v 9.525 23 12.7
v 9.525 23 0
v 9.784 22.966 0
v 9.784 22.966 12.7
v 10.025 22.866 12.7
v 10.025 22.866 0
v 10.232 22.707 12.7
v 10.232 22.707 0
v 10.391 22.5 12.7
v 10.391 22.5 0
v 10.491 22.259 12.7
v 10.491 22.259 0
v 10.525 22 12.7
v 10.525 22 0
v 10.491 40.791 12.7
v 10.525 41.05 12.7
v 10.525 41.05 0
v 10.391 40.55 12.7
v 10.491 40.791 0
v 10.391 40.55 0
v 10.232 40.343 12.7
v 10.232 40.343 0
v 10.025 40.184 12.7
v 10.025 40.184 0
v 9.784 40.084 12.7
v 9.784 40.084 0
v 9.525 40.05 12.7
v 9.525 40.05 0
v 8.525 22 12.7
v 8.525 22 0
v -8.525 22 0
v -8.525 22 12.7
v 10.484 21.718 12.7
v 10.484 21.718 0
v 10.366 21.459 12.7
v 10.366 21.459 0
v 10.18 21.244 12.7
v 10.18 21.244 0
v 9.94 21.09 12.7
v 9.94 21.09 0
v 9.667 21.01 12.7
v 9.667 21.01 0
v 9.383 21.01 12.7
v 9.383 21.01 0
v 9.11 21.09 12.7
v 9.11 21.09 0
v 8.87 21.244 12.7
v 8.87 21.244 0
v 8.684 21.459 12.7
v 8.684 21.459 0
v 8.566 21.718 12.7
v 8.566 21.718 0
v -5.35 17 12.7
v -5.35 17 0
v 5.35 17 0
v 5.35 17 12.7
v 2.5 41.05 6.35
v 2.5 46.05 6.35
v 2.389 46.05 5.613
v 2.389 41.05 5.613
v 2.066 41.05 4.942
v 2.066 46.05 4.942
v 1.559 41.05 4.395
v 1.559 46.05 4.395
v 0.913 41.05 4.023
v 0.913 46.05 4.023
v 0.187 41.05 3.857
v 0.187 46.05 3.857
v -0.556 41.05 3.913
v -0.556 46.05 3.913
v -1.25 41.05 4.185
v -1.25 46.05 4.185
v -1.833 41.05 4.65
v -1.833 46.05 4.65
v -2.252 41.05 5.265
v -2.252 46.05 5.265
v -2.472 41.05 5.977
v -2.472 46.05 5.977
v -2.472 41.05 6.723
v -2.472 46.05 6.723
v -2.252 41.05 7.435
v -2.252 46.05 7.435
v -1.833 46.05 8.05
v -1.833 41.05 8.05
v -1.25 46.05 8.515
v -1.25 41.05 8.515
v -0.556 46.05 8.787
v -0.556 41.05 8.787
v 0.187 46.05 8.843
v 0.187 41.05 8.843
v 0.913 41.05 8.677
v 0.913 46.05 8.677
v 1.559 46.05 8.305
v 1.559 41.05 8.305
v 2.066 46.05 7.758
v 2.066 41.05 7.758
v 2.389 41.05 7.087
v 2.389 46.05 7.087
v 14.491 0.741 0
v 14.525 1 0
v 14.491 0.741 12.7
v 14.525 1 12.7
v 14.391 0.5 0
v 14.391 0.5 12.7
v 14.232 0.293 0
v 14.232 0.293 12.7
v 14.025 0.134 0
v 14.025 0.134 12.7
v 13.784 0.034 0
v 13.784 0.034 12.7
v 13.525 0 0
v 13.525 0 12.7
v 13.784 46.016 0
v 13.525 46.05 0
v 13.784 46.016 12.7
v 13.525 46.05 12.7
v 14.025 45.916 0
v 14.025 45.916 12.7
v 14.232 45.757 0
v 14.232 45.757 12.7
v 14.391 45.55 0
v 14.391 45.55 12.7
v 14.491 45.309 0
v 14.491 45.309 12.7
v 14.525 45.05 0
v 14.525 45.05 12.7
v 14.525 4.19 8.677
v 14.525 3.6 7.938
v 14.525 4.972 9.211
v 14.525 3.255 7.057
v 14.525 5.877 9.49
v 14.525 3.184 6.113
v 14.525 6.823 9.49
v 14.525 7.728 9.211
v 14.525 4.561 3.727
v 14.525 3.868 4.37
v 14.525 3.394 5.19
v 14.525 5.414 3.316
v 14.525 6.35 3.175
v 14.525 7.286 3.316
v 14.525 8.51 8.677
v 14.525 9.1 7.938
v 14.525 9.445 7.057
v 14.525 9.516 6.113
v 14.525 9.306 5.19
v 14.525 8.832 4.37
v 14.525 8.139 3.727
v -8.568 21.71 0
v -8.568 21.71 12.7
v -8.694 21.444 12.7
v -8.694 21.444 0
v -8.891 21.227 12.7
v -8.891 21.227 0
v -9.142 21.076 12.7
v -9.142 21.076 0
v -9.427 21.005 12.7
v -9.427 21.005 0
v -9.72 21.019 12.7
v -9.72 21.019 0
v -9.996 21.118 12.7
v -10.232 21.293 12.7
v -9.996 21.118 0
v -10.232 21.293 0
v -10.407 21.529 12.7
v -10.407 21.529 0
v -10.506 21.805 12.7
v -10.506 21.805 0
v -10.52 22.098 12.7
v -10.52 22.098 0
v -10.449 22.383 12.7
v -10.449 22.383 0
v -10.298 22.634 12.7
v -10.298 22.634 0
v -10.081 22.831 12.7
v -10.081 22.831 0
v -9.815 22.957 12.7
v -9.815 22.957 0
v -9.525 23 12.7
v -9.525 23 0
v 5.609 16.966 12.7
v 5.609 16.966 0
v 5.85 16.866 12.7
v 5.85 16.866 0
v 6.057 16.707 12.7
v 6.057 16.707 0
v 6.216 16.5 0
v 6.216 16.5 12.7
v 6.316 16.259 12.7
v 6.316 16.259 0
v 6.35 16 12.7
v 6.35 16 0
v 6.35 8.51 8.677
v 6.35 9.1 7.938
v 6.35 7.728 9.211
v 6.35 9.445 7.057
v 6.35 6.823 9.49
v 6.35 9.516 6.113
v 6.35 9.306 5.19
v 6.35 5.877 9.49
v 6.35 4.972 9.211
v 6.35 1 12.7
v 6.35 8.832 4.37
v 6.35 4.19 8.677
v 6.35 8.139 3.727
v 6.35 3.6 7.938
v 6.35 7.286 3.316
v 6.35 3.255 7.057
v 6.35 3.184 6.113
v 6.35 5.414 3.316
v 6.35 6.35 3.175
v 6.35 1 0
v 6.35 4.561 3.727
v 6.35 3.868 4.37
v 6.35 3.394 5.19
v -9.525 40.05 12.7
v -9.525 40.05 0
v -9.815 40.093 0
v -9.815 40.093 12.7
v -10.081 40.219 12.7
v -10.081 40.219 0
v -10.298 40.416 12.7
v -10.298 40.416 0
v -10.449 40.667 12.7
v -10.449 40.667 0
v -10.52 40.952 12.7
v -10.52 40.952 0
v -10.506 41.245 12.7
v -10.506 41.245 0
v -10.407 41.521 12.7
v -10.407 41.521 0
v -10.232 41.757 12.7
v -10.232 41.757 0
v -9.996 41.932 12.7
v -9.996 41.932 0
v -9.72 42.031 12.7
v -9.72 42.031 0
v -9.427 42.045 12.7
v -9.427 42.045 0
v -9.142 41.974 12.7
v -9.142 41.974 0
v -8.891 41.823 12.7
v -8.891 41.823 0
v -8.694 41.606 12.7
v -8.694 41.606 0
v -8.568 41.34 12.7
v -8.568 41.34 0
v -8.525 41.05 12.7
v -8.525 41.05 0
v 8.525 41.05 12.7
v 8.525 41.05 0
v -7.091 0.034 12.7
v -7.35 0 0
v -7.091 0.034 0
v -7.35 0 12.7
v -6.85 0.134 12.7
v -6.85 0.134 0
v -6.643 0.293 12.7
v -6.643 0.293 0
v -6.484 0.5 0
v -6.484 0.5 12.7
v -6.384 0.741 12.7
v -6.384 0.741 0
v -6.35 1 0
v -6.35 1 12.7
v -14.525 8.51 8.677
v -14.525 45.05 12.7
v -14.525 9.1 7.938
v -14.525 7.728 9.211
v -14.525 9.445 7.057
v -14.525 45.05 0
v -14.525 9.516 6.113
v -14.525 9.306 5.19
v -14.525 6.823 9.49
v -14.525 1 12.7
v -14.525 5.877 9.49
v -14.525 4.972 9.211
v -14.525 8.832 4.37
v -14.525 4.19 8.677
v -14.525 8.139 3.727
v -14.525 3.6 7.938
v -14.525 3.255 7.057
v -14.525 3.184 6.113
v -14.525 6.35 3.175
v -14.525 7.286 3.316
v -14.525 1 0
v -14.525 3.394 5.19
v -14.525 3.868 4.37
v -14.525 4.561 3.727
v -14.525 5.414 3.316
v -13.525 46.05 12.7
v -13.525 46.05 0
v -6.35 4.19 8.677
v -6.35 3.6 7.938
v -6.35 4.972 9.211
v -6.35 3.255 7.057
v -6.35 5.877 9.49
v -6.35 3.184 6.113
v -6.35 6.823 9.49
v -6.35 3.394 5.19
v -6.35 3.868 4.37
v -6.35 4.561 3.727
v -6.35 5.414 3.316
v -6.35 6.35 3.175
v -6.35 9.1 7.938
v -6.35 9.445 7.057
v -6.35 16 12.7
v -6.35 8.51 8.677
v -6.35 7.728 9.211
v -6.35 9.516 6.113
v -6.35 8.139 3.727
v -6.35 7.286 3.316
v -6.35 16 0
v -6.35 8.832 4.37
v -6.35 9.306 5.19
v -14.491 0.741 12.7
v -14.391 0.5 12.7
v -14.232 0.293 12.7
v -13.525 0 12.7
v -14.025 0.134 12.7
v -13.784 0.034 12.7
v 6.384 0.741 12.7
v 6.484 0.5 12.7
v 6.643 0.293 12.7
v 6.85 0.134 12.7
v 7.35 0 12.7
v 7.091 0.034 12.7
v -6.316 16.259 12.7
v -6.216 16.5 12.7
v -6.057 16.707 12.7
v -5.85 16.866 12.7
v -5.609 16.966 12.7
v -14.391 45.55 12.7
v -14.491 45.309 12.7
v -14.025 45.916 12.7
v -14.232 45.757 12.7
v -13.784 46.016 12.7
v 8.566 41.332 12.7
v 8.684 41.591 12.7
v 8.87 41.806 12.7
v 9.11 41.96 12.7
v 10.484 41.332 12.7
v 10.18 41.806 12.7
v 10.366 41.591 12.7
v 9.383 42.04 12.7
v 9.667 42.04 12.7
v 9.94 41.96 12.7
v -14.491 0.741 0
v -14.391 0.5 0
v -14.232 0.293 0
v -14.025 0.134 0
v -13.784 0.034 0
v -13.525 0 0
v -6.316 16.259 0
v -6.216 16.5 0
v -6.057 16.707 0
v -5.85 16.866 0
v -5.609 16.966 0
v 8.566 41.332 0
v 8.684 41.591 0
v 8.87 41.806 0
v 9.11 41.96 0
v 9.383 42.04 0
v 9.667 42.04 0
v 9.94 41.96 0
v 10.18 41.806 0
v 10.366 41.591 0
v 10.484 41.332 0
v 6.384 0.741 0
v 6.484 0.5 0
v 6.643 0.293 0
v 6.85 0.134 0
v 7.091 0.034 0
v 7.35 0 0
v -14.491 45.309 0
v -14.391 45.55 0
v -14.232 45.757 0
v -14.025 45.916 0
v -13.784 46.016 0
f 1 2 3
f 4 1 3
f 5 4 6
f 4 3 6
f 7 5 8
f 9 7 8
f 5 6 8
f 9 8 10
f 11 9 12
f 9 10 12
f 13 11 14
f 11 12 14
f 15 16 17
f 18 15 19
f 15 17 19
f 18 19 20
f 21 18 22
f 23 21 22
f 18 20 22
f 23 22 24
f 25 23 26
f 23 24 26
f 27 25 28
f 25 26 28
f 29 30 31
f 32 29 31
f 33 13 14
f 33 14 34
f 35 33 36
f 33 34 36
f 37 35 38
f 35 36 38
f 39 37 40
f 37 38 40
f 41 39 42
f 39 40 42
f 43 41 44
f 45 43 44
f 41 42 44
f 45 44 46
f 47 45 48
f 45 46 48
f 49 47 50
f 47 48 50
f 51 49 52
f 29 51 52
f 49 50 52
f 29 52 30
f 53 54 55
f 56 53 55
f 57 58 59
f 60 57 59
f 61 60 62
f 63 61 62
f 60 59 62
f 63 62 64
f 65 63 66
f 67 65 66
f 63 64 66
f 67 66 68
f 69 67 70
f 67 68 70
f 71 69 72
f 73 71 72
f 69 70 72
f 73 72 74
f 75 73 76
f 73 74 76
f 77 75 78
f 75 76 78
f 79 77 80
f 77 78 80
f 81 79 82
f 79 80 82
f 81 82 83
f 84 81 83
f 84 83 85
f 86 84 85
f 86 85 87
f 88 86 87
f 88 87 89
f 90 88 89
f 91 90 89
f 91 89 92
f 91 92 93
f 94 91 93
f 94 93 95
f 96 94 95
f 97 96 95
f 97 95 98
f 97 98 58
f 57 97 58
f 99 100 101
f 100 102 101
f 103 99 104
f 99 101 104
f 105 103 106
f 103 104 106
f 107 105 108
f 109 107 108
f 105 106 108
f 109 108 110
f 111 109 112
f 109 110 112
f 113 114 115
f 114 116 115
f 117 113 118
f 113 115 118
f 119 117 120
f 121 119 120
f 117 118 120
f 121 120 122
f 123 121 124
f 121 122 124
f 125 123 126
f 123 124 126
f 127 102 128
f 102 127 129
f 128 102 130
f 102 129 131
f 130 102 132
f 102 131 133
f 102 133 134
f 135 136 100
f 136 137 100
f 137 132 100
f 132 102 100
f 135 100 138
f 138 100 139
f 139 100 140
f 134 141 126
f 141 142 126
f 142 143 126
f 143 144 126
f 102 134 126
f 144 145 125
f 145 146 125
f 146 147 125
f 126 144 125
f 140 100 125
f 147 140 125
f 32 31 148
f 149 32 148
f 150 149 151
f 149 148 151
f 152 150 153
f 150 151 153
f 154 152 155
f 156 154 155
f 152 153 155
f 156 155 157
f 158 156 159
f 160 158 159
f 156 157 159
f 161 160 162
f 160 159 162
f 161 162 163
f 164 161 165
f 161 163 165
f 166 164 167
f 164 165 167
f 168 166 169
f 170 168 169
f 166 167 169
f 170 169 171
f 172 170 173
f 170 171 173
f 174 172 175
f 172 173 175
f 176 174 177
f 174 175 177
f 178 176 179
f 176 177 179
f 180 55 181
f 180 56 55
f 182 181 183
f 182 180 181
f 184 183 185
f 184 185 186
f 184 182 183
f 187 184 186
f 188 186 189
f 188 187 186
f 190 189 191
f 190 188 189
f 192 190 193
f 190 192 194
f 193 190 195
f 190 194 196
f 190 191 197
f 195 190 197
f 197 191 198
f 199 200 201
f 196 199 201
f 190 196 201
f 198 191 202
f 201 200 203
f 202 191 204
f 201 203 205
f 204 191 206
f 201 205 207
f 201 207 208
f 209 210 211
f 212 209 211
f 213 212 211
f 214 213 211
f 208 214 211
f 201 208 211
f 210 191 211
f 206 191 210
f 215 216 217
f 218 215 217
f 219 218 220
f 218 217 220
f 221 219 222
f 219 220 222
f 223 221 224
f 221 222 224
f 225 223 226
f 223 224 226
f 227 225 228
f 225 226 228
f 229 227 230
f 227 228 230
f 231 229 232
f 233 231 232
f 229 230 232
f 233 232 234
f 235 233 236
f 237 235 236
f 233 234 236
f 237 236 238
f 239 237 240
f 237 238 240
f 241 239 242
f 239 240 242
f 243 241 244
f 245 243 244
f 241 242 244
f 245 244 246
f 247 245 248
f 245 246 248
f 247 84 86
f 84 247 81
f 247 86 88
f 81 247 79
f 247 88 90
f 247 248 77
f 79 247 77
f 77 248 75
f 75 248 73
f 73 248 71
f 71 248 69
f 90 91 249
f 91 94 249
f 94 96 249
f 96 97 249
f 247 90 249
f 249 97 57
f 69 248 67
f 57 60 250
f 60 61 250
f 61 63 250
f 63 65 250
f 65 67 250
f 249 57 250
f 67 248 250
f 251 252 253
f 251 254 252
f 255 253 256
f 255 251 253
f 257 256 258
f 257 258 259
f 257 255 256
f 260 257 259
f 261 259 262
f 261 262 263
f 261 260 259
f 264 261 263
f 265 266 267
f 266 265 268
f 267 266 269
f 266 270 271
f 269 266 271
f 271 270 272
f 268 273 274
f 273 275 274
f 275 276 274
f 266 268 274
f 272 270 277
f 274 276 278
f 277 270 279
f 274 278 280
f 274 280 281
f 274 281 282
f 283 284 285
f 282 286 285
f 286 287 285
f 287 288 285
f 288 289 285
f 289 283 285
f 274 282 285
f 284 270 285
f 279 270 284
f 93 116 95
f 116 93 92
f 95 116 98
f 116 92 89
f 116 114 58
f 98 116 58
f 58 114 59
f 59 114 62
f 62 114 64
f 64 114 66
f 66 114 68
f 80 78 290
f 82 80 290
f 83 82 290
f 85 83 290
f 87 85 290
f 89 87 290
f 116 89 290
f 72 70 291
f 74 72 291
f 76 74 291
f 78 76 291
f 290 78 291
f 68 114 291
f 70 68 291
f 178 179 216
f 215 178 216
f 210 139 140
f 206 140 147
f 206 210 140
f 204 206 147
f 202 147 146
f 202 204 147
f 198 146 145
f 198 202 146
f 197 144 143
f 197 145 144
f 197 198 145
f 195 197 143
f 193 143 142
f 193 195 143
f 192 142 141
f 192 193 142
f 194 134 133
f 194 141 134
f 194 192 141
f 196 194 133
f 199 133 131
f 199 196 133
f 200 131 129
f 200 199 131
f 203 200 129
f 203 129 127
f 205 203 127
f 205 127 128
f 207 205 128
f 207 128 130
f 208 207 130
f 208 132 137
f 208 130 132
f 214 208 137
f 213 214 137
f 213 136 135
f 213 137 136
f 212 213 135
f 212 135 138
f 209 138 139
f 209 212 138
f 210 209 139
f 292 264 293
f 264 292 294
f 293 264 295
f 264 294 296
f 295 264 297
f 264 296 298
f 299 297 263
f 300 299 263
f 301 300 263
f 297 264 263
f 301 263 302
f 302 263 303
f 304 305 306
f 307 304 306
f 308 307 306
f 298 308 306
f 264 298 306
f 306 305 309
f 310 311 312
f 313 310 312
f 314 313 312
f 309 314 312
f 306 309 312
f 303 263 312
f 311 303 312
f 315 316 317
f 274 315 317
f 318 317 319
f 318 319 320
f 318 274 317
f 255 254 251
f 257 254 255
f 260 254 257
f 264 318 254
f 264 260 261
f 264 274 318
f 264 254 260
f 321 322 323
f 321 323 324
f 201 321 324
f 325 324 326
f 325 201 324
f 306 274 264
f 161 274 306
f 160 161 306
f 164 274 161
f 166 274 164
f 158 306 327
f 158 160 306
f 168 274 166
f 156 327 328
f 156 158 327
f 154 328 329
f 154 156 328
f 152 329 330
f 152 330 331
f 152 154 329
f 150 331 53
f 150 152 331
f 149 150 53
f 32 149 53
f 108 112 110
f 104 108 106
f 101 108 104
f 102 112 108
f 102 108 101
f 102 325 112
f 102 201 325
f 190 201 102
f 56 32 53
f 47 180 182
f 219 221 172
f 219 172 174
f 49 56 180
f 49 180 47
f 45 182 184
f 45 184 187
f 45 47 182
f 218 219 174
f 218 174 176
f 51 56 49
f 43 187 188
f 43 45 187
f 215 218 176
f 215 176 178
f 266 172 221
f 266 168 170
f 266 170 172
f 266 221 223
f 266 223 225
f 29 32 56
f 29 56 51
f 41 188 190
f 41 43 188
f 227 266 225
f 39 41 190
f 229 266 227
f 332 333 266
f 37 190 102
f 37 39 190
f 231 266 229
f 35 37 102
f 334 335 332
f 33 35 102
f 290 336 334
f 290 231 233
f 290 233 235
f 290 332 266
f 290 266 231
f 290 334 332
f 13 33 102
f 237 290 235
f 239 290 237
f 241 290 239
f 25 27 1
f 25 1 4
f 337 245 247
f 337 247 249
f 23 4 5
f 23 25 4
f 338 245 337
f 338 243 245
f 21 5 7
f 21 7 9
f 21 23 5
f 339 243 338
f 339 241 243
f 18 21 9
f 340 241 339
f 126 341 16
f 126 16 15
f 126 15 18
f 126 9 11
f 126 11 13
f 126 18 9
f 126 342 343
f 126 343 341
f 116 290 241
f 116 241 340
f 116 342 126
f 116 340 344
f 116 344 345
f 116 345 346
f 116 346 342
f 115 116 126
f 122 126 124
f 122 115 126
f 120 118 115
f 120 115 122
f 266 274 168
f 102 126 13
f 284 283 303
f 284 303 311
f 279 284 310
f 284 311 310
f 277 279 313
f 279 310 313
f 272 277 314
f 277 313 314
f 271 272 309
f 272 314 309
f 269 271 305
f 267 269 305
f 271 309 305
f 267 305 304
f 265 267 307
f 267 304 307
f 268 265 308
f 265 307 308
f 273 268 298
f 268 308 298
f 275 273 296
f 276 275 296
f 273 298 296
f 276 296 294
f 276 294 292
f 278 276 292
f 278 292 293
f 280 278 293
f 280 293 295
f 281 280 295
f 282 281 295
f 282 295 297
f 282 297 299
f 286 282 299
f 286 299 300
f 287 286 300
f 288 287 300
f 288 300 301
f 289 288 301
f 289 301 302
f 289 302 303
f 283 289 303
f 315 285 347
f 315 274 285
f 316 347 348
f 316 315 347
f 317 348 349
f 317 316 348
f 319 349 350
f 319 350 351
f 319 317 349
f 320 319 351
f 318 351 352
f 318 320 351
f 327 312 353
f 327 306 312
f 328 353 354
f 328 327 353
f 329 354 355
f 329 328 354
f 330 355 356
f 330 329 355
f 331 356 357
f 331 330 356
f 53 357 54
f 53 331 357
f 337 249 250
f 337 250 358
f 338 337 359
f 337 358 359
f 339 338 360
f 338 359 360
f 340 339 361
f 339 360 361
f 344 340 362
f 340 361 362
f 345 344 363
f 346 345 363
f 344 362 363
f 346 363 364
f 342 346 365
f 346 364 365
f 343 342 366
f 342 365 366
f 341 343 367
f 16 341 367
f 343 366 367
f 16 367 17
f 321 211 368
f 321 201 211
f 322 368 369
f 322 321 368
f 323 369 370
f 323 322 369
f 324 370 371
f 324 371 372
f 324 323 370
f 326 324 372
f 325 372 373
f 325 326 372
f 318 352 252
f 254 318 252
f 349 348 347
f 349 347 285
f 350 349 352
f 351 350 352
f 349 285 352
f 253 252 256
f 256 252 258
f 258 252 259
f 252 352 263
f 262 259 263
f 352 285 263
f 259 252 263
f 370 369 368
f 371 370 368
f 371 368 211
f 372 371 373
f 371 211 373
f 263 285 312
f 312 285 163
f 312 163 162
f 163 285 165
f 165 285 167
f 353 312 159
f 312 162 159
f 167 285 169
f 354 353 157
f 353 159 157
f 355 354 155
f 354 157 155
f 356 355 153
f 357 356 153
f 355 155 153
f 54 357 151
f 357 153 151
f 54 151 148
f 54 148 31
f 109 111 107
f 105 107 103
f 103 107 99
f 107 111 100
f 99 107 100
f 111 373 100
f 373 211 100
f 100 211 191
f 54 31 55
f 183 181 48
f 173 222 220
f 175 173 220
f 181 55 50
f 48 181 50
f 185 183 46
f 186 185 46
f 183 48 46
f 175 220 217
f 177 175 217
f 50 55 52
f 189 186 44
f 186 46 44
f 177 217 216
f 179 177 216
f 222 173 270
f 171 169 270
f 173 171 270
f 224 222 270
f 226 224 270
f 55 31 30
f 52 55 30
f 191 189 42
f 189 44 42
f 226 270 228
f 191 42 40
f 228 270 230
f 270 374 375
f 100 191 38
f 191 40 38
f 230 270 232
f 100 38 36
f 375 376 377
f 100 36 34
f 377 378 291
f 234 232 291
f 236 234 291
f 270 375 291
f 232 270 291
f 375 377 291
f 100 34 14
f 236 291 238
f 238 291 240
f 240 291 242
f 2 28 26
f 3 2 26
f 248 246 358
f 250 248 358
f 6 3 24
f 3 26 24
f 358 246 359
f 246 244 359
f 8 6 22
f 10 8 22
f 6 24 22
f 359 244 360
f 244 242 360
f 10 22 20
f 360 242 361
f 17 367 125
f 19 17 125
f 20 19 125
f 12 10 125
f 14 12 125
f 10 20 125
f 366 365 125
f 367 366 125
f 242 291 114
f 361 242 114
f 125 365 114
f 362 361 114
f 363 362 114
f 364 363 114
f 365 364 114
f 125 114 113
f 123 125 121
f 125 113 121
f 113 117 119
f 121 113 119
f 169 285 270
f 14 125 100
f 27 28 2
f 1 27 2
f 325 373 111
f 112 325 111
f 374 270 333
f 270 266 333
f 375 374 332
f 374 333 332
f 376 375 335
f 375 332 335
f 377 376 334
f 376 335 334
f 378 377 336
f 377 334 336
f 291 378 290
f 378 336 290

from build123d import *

# Parameters (mm, degrees)
BOSS_EXTRU_1_DEPTH           = 12.7
ESQUISSE2_R                  = 3.175
ENL_V_MAT_EXTRU_1_DEPTH      = 21.875
ENL_V_MAT_EXTRU_1_DEPTH_BACK = 9.175
CONG_2_R                     = 1
ENL_V_MAT_EXTRU_2_REACH      = 48.05
ESQUISSE3_R                  = 2.5


with BuildPart() as part:
    # Esquisse1 → Boss.-Extru.1 (new body)
    with BuildSketch(Plane.XY):
        with BuildLine():
            Line((0, 41.05), (0, 46.05))
            Line((0, 46.05), (-14.525, 46.05))
            Line((-14.525, 46.05), (-14.525, 0))
            Line((-14.525, 0), (-6.35, 0))
            Line((-6.35, 0), (-6.35, 17))
            Line((-6.35, 17), (0, 17))
            Line((0, 17), (0, 22))
            Line((0, 22), (-8.525, 22))
            ThreePointArc((-8.525, 22), (-10.232106781, 21.292893219), (-9.525, 23))
            Line((-9.525, 23), (-9.525, 40.05))
            ThreePointArc((-9.525, 40.05), (-10.232106781, 41.757106781), (-8.525, 41.05))
            Line((-8.525, 41.05), (0, 41.05))
        make_face()
        with BuildLine():
            Line((14.525, 0), (14.525, 46.05))
            Line((14.525, 46.05), (0, 46.05))
            Line((0, 46.05), (0, 41.05))
            Line((0, 41.05), (8.525, 41.05))
            ThreePointArc((8.525, 41.05), (9.525, 42.05), (10.525, 41.05))
            ThreePointArc((10.525, 41.05), (10.232106781, 40.342893219), (9.525, 40.05))
            Line((9.525, 40.05), (9.525, 23))
            ThreePointArc((9.525, 23), (10.232106781, 22.707106781), (10.525, 22))
            ThreePointArc((10.525, 22), (9.525, 21), (8.525, 22))
            Line((8.525, 22), (0, 22))
            Line((0, 22), (0, 17))
            Line((0, 17), (6.35, 17))
            Line((6.35, 17), (6.35, 0))
            Line((6.35, 0), (14.525, 0))
        make_face()
    extrude(amount=BOSS_EXTRU_1_DEPTH)

    # Esquisse2 → Enlèv. mat.-Extru.1 (cut, two sides)
    with BuildSketch(Plane(origin=(-6.35, 0, 0), x_dir=(0, 0, -1), z_dir=(1, 0, 0))) as enl_v_mat_extru_1_sk:
        with Locations((-6.35, 6.35)):
            Circle(ESQUISSE2_R)
    extrude(amount=ENL_V_MAT_EXTRU_1_DEPTH, mode=Mode.SUBTRACT)
    extrude(enl_v_mat_extru_1_sk.sketch, amount=-ENL_V_MAT_EXTRU_1_DEPTH_BACK, mode=Mode.SUBTRACT)

    # Congé2
    cong_2_edges = [part.edges().sort_by_distance(p)[0] for p in [
        (14.525, 0, 6.35),
        (6.35, 0, 6.35),
        (6.35, 17, 6.35),
        (-6.35, 17, 6.35),
        (-6.35, 0, 6.35),
        (-14.525, 0, 6.35),
        (-14.525, 46.05, 6.35),
        (14.525, 46.05, 6.35),
    ]]
    fillet(cong_2_edges, radius=CONG_2_R)

    # Esquisse3 → Enlèv. mat.-Extru.2 (cut, up to next)
    with BuildSketch(Plane(origin=(0, 46.05, 0), x_dir=(1, 0, 0), z_dir=(0, 1, 0)), mode=Mode.PRIVATE) as enl_v_mat_extru_2_sk1:
        with Locations((0, -6.35)):
            Circle(ESQUISSE3_R)
    enl_v_mat_extru_2_tool1 = extrude(enl_v_mat_extru_2_sk1.sketch, amount=-ENL_V_MAT_EXTRU_2_REACH, mode=Mode.PRIVATE) & part.part
    add(enl_v_mat_extru_2_tool1.solids().sort_by_distance((0, 46.05, 6.35))[0], mode=Mode.SUBTRACT)


solid = part.part
